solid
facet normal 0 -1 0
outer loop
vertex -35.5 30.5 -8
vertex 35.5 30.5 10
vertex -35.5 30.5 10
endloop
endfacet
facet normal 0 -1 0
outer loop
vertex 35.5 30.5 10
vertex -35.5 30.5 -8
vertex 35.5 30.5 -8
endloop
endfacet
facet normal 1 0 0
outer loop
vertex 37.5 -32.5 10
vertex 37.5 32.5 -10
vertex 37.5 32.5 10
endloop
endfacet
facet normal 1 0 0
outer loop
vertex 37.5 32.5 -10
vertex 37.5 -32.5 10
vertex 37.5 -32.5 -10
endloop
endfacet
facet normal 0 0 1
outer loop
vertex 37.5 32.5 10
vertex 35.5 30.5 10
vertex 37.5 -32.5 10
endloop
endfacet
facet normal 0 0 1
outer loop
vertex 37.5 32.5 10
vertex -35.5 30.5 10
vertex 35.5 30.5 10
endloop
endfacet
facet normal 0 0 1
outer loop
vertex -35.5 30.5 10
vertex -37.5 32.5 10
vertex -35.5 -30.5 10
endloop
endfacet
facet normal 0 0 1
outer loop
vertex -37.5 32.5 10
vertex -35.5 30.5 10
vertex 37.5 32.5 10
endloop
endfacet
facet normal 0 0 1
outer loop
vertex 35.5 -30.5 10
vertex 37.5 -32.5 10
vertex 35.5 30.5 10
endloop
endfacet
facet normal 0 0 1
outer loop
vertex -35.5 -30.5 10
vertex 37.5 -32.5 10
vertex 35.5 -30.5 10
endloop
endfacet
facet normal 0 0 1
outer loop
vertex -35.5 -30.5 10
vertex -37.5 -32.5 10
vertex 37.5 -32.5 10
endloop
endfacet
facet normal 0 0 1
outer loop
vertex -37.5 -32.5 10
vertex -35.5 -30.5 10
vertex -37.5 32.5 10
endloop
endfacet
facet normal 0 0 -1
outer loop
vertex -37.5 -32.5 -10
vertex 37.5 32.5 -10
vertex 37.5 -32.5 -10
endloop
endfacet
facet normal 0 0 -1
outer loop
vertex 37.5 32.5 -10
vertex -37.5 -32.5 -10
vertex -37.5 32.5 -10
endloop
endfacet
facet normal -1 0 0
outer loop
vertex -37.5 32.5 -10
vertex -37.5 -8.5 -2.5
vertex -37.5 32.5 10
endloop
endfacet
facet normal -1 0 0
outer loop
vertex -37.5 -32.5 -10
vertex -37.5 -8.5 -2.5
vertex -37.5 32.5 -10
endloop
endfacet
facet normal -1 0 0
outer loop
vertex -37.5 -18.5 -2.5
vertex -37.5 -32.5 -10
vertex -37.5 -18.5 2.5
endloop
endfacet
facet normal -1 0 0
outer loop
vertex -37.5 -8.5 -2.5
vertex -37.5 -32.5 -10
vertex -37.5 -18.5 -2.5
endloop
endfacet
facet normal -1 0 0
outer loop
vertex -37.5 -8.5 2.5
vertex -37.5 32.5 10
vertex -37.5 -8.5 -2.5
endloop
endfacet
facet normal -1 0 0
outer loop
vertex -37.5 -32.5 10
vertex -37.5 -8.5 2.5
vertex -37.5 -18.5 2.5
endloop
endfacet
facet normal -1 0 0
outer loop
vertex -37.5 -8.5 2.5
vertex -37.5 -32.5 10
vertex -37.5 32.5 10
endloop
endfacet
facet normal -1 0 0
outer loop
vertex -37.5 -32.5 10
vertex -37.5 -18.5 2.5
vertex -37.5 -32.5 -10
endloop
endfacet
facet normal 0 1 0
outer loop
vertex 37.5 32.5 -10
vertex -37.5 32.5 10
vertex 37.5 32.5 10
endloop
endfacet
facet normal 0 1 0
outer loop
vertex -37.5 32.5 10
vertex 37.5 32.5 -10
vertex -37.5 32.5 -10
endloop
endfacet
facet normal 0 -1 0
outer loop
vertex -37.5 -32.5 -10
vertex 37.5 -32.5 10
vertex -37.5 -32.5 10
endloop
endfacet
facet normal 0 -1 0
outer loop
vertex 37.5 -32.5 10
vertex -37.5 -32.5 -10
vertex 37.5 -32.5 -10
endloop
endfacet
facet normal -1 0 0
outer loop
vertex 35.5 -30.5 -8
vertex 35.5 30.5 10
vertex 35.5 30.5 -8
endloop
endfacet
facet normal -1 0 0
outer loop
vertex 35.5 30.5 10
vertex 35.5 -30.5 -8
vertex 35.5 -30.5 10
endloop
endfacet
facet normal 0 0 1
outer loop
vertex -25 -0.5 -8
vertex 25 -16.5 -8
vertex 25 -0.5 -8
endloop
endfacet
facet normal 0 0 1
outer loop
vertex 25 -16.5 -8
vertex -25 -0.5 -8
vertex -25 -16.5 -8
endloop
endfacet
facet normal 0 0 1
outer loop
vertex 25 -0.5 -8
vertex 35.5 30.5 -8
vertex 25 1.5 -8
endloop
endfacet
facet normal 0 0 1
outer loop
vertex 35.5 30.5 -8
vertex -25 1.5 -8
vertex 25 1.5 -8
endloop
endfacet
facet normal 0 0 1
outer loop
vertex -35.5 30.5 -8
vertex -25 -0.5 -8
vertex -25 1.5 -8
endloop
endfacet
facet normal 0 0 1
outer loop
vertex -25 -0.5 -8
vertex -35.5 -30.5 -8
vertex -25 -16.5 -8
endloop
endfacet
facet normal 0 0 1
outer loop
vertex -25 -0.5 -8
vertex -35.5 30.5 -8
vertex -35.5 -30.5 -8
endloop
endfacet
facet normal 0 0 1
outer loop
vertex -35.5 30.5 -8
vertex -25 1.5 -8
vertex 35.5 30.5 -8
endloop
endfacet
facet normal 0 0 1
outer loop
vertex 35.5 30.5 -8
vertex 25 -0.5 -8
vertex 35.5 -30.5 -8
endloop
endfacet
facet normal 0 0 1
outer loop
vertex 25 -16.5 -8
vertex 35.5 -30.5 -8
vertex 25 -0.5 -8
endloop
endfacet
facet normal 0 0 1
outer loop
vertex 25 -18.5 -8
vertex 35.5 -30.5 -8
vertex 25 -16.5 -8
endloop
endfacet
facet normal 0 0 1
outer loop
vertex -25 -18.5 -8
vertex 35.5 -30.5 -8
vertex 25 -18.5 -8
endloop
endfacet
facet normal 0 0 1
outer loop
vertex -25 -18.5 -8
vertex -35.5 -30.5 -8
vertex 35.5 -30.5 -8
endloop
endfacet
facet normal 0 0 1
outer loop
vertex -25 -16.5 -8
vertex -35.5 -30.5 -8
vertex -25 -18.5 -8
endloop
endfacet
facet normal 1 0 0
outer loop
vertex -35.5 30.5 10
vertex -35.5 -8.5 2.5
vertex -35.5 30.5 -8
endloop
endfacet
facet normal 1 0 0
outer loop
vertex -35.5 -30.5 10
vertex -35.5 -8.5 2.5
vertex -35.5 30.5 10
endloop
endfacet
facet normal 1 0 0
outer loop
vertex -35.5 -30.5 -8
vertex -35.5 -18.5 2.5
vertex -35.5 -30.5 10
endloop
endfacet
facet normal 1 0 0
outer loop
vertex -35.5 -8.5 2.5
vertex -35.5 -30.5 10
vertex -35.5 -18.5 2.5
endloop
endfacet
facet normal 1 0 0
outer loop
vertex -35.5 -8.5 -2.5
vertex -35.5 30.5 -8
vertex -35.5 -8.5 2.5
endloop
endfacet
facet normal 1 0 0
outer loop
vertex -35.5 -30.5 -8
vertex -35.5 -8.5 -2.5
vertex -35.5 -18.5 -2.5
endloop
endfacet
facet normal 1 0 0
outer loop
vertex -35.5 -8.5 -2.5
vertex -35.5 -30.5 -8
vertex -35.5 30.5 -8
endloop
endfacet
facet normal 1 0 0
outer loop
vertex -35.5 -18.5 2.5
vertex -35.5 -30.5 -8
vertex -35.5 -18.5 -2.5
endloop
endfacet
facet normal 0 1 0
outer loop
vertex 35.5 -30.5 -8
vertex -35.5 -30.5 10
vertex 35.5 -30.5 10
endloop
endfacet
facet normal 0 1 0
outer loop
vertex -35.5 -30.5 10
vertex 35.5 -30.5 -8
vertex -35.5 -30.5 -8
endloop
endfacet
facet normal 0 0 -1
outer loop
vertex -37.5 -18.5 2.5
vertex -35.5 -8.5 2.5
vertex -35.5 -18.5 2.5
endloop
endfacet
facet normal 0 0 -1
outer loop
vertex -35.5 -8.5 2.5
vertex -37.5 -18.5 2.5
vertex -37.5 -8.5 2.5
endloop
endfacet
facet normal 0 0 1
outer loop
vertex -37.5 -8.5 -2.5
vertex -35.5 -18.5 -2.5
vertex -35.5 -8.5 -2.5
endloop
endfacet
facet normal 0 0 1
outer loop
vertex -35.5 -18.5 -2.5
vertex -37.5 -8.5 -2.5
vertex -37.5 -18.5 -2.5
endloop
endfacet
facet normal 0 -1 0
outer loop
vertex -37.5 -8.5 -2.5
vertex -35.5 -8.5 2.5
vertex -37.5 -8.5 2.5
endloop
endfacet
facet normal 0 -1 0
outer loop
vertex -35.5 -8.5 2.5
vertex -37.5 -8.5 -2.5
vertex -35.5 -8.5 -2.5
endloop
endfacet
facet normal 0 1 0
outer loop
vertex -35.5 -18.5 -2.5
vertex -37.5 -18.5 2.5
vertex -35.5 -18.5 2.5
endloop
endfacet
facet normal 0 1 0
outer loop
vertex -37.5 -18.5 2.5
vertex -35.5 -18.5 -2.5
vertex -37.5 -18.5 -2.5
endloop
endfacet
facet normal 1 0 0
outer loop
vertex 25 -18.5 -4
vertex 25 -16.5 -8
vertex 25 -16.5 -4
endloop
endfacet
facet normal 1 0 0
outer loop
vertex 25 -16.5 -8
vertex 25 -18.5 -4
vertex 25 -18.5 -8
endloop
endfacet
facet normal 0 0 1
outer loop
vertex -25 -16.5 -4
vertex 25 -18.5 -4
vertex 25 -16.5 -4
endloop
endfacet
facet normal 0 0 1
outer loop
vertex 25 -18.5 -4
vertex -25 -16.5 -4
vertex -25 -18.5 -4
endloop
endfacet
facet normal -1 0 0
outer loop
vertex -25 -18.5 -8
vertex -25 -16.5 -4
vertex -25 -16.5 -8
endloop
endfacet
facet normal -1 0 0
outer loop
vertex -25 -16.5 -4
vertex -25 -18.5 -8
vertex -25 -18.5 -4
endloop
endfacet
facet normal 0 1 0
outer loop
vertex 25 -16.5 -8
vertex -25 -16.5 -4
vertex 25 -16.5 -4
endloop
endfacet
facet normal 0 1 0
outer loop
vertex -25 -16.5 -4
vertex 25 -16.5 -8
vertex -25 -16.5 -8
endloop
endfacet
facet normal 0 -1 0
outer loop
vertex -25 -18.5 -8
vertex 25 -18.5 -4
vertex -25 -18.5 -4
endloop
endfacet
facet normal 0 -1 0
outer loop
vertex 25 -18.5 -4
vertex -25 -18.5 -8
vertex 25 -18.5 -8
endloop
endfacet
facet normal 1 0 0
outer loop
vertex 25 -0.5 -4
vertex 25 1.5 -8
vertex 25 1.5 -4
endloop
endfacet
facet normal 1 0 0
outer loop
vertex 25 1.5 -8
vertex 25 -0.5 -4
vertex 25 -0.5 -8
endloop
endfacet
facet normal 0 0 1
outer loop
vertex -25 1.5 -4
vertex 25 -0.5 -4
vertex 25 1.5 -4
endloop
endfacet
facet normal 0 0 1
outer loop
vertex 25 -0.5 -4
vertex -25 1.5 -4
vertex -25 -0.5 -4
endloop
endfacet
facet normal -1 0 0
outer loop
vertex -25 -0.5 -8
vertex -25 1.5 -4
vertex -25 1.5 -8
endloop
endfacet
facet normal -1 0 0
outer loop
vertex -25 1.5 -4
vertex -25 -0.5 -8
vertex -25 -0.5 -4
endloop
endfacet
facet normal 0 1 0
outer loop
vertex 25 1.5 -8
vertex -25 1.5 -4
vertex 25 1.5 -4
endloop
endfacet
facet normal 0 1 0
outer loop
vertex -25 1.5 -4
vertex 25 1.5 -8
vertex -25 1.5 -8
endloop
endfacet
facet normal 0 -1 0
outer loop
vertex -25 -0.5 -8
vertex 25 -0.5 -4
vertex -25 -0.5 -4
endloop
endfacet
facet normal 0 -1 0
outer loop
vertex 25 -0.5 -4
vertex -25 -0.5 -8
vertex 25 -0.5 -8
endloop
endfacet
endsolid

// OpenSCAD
// ESP32 DevKit Enclosure with OLED Display
// ESP32: ~55mm x 28mm, OLED: 27mm x 27mm
esp_length = 55;
esp_width = 28;
oled_size = 27;
oled_view = 22;  // Visible area
box_height = 20;
wall = 2;

// Main enclosure
difference() {
    // Outer box
    cube([esp_length + 20, esp_width + oled_size + 10, box_height], center=true);

    // Inner cavity
    translate([0, 0, wall])
        cube([esp_length + 16, esp_width + oled_size + 6, box_height], center=true);

    // USB port cutout
    translate([-(esp_length/2 + 10), -((esp_width + oled_size)/2 - esp_width/2), 0])
        cube([wall*3, 10, 5], center=true);

    // OLED display window
    translate([0, (esp_width + oled_size)/2 - oled_size/2 - 2, box_height/2 - wall/2])
        cube([oled_view, oled_view, wall*2], center=true);

    // Ventilation slots
    for (i = [0:3]) {
        translate([i * 10 - 15, -((esp_width + oled_size)/2), 0])
            cube([6, wall*2, 8], center=true);
    }

    // Button holes (2x)
    for (x = [-1, 1]) {
        translate([x * 20, (esp_width + oled_size)/2, 0])
            rotate([90, 0, 0])
                cylinder(d=6, h=wall*3, center=true, $fn=32);
    }
}

// ESP32 mounting rails
for (y = [-1, 1]) {
    translate([0, y * (esp_width/2 - 5) - (oled_size/2 - 5), -box_height/2 + wall + 2])
        cube([esp_length - 5, 2, 4], center=true);
}
